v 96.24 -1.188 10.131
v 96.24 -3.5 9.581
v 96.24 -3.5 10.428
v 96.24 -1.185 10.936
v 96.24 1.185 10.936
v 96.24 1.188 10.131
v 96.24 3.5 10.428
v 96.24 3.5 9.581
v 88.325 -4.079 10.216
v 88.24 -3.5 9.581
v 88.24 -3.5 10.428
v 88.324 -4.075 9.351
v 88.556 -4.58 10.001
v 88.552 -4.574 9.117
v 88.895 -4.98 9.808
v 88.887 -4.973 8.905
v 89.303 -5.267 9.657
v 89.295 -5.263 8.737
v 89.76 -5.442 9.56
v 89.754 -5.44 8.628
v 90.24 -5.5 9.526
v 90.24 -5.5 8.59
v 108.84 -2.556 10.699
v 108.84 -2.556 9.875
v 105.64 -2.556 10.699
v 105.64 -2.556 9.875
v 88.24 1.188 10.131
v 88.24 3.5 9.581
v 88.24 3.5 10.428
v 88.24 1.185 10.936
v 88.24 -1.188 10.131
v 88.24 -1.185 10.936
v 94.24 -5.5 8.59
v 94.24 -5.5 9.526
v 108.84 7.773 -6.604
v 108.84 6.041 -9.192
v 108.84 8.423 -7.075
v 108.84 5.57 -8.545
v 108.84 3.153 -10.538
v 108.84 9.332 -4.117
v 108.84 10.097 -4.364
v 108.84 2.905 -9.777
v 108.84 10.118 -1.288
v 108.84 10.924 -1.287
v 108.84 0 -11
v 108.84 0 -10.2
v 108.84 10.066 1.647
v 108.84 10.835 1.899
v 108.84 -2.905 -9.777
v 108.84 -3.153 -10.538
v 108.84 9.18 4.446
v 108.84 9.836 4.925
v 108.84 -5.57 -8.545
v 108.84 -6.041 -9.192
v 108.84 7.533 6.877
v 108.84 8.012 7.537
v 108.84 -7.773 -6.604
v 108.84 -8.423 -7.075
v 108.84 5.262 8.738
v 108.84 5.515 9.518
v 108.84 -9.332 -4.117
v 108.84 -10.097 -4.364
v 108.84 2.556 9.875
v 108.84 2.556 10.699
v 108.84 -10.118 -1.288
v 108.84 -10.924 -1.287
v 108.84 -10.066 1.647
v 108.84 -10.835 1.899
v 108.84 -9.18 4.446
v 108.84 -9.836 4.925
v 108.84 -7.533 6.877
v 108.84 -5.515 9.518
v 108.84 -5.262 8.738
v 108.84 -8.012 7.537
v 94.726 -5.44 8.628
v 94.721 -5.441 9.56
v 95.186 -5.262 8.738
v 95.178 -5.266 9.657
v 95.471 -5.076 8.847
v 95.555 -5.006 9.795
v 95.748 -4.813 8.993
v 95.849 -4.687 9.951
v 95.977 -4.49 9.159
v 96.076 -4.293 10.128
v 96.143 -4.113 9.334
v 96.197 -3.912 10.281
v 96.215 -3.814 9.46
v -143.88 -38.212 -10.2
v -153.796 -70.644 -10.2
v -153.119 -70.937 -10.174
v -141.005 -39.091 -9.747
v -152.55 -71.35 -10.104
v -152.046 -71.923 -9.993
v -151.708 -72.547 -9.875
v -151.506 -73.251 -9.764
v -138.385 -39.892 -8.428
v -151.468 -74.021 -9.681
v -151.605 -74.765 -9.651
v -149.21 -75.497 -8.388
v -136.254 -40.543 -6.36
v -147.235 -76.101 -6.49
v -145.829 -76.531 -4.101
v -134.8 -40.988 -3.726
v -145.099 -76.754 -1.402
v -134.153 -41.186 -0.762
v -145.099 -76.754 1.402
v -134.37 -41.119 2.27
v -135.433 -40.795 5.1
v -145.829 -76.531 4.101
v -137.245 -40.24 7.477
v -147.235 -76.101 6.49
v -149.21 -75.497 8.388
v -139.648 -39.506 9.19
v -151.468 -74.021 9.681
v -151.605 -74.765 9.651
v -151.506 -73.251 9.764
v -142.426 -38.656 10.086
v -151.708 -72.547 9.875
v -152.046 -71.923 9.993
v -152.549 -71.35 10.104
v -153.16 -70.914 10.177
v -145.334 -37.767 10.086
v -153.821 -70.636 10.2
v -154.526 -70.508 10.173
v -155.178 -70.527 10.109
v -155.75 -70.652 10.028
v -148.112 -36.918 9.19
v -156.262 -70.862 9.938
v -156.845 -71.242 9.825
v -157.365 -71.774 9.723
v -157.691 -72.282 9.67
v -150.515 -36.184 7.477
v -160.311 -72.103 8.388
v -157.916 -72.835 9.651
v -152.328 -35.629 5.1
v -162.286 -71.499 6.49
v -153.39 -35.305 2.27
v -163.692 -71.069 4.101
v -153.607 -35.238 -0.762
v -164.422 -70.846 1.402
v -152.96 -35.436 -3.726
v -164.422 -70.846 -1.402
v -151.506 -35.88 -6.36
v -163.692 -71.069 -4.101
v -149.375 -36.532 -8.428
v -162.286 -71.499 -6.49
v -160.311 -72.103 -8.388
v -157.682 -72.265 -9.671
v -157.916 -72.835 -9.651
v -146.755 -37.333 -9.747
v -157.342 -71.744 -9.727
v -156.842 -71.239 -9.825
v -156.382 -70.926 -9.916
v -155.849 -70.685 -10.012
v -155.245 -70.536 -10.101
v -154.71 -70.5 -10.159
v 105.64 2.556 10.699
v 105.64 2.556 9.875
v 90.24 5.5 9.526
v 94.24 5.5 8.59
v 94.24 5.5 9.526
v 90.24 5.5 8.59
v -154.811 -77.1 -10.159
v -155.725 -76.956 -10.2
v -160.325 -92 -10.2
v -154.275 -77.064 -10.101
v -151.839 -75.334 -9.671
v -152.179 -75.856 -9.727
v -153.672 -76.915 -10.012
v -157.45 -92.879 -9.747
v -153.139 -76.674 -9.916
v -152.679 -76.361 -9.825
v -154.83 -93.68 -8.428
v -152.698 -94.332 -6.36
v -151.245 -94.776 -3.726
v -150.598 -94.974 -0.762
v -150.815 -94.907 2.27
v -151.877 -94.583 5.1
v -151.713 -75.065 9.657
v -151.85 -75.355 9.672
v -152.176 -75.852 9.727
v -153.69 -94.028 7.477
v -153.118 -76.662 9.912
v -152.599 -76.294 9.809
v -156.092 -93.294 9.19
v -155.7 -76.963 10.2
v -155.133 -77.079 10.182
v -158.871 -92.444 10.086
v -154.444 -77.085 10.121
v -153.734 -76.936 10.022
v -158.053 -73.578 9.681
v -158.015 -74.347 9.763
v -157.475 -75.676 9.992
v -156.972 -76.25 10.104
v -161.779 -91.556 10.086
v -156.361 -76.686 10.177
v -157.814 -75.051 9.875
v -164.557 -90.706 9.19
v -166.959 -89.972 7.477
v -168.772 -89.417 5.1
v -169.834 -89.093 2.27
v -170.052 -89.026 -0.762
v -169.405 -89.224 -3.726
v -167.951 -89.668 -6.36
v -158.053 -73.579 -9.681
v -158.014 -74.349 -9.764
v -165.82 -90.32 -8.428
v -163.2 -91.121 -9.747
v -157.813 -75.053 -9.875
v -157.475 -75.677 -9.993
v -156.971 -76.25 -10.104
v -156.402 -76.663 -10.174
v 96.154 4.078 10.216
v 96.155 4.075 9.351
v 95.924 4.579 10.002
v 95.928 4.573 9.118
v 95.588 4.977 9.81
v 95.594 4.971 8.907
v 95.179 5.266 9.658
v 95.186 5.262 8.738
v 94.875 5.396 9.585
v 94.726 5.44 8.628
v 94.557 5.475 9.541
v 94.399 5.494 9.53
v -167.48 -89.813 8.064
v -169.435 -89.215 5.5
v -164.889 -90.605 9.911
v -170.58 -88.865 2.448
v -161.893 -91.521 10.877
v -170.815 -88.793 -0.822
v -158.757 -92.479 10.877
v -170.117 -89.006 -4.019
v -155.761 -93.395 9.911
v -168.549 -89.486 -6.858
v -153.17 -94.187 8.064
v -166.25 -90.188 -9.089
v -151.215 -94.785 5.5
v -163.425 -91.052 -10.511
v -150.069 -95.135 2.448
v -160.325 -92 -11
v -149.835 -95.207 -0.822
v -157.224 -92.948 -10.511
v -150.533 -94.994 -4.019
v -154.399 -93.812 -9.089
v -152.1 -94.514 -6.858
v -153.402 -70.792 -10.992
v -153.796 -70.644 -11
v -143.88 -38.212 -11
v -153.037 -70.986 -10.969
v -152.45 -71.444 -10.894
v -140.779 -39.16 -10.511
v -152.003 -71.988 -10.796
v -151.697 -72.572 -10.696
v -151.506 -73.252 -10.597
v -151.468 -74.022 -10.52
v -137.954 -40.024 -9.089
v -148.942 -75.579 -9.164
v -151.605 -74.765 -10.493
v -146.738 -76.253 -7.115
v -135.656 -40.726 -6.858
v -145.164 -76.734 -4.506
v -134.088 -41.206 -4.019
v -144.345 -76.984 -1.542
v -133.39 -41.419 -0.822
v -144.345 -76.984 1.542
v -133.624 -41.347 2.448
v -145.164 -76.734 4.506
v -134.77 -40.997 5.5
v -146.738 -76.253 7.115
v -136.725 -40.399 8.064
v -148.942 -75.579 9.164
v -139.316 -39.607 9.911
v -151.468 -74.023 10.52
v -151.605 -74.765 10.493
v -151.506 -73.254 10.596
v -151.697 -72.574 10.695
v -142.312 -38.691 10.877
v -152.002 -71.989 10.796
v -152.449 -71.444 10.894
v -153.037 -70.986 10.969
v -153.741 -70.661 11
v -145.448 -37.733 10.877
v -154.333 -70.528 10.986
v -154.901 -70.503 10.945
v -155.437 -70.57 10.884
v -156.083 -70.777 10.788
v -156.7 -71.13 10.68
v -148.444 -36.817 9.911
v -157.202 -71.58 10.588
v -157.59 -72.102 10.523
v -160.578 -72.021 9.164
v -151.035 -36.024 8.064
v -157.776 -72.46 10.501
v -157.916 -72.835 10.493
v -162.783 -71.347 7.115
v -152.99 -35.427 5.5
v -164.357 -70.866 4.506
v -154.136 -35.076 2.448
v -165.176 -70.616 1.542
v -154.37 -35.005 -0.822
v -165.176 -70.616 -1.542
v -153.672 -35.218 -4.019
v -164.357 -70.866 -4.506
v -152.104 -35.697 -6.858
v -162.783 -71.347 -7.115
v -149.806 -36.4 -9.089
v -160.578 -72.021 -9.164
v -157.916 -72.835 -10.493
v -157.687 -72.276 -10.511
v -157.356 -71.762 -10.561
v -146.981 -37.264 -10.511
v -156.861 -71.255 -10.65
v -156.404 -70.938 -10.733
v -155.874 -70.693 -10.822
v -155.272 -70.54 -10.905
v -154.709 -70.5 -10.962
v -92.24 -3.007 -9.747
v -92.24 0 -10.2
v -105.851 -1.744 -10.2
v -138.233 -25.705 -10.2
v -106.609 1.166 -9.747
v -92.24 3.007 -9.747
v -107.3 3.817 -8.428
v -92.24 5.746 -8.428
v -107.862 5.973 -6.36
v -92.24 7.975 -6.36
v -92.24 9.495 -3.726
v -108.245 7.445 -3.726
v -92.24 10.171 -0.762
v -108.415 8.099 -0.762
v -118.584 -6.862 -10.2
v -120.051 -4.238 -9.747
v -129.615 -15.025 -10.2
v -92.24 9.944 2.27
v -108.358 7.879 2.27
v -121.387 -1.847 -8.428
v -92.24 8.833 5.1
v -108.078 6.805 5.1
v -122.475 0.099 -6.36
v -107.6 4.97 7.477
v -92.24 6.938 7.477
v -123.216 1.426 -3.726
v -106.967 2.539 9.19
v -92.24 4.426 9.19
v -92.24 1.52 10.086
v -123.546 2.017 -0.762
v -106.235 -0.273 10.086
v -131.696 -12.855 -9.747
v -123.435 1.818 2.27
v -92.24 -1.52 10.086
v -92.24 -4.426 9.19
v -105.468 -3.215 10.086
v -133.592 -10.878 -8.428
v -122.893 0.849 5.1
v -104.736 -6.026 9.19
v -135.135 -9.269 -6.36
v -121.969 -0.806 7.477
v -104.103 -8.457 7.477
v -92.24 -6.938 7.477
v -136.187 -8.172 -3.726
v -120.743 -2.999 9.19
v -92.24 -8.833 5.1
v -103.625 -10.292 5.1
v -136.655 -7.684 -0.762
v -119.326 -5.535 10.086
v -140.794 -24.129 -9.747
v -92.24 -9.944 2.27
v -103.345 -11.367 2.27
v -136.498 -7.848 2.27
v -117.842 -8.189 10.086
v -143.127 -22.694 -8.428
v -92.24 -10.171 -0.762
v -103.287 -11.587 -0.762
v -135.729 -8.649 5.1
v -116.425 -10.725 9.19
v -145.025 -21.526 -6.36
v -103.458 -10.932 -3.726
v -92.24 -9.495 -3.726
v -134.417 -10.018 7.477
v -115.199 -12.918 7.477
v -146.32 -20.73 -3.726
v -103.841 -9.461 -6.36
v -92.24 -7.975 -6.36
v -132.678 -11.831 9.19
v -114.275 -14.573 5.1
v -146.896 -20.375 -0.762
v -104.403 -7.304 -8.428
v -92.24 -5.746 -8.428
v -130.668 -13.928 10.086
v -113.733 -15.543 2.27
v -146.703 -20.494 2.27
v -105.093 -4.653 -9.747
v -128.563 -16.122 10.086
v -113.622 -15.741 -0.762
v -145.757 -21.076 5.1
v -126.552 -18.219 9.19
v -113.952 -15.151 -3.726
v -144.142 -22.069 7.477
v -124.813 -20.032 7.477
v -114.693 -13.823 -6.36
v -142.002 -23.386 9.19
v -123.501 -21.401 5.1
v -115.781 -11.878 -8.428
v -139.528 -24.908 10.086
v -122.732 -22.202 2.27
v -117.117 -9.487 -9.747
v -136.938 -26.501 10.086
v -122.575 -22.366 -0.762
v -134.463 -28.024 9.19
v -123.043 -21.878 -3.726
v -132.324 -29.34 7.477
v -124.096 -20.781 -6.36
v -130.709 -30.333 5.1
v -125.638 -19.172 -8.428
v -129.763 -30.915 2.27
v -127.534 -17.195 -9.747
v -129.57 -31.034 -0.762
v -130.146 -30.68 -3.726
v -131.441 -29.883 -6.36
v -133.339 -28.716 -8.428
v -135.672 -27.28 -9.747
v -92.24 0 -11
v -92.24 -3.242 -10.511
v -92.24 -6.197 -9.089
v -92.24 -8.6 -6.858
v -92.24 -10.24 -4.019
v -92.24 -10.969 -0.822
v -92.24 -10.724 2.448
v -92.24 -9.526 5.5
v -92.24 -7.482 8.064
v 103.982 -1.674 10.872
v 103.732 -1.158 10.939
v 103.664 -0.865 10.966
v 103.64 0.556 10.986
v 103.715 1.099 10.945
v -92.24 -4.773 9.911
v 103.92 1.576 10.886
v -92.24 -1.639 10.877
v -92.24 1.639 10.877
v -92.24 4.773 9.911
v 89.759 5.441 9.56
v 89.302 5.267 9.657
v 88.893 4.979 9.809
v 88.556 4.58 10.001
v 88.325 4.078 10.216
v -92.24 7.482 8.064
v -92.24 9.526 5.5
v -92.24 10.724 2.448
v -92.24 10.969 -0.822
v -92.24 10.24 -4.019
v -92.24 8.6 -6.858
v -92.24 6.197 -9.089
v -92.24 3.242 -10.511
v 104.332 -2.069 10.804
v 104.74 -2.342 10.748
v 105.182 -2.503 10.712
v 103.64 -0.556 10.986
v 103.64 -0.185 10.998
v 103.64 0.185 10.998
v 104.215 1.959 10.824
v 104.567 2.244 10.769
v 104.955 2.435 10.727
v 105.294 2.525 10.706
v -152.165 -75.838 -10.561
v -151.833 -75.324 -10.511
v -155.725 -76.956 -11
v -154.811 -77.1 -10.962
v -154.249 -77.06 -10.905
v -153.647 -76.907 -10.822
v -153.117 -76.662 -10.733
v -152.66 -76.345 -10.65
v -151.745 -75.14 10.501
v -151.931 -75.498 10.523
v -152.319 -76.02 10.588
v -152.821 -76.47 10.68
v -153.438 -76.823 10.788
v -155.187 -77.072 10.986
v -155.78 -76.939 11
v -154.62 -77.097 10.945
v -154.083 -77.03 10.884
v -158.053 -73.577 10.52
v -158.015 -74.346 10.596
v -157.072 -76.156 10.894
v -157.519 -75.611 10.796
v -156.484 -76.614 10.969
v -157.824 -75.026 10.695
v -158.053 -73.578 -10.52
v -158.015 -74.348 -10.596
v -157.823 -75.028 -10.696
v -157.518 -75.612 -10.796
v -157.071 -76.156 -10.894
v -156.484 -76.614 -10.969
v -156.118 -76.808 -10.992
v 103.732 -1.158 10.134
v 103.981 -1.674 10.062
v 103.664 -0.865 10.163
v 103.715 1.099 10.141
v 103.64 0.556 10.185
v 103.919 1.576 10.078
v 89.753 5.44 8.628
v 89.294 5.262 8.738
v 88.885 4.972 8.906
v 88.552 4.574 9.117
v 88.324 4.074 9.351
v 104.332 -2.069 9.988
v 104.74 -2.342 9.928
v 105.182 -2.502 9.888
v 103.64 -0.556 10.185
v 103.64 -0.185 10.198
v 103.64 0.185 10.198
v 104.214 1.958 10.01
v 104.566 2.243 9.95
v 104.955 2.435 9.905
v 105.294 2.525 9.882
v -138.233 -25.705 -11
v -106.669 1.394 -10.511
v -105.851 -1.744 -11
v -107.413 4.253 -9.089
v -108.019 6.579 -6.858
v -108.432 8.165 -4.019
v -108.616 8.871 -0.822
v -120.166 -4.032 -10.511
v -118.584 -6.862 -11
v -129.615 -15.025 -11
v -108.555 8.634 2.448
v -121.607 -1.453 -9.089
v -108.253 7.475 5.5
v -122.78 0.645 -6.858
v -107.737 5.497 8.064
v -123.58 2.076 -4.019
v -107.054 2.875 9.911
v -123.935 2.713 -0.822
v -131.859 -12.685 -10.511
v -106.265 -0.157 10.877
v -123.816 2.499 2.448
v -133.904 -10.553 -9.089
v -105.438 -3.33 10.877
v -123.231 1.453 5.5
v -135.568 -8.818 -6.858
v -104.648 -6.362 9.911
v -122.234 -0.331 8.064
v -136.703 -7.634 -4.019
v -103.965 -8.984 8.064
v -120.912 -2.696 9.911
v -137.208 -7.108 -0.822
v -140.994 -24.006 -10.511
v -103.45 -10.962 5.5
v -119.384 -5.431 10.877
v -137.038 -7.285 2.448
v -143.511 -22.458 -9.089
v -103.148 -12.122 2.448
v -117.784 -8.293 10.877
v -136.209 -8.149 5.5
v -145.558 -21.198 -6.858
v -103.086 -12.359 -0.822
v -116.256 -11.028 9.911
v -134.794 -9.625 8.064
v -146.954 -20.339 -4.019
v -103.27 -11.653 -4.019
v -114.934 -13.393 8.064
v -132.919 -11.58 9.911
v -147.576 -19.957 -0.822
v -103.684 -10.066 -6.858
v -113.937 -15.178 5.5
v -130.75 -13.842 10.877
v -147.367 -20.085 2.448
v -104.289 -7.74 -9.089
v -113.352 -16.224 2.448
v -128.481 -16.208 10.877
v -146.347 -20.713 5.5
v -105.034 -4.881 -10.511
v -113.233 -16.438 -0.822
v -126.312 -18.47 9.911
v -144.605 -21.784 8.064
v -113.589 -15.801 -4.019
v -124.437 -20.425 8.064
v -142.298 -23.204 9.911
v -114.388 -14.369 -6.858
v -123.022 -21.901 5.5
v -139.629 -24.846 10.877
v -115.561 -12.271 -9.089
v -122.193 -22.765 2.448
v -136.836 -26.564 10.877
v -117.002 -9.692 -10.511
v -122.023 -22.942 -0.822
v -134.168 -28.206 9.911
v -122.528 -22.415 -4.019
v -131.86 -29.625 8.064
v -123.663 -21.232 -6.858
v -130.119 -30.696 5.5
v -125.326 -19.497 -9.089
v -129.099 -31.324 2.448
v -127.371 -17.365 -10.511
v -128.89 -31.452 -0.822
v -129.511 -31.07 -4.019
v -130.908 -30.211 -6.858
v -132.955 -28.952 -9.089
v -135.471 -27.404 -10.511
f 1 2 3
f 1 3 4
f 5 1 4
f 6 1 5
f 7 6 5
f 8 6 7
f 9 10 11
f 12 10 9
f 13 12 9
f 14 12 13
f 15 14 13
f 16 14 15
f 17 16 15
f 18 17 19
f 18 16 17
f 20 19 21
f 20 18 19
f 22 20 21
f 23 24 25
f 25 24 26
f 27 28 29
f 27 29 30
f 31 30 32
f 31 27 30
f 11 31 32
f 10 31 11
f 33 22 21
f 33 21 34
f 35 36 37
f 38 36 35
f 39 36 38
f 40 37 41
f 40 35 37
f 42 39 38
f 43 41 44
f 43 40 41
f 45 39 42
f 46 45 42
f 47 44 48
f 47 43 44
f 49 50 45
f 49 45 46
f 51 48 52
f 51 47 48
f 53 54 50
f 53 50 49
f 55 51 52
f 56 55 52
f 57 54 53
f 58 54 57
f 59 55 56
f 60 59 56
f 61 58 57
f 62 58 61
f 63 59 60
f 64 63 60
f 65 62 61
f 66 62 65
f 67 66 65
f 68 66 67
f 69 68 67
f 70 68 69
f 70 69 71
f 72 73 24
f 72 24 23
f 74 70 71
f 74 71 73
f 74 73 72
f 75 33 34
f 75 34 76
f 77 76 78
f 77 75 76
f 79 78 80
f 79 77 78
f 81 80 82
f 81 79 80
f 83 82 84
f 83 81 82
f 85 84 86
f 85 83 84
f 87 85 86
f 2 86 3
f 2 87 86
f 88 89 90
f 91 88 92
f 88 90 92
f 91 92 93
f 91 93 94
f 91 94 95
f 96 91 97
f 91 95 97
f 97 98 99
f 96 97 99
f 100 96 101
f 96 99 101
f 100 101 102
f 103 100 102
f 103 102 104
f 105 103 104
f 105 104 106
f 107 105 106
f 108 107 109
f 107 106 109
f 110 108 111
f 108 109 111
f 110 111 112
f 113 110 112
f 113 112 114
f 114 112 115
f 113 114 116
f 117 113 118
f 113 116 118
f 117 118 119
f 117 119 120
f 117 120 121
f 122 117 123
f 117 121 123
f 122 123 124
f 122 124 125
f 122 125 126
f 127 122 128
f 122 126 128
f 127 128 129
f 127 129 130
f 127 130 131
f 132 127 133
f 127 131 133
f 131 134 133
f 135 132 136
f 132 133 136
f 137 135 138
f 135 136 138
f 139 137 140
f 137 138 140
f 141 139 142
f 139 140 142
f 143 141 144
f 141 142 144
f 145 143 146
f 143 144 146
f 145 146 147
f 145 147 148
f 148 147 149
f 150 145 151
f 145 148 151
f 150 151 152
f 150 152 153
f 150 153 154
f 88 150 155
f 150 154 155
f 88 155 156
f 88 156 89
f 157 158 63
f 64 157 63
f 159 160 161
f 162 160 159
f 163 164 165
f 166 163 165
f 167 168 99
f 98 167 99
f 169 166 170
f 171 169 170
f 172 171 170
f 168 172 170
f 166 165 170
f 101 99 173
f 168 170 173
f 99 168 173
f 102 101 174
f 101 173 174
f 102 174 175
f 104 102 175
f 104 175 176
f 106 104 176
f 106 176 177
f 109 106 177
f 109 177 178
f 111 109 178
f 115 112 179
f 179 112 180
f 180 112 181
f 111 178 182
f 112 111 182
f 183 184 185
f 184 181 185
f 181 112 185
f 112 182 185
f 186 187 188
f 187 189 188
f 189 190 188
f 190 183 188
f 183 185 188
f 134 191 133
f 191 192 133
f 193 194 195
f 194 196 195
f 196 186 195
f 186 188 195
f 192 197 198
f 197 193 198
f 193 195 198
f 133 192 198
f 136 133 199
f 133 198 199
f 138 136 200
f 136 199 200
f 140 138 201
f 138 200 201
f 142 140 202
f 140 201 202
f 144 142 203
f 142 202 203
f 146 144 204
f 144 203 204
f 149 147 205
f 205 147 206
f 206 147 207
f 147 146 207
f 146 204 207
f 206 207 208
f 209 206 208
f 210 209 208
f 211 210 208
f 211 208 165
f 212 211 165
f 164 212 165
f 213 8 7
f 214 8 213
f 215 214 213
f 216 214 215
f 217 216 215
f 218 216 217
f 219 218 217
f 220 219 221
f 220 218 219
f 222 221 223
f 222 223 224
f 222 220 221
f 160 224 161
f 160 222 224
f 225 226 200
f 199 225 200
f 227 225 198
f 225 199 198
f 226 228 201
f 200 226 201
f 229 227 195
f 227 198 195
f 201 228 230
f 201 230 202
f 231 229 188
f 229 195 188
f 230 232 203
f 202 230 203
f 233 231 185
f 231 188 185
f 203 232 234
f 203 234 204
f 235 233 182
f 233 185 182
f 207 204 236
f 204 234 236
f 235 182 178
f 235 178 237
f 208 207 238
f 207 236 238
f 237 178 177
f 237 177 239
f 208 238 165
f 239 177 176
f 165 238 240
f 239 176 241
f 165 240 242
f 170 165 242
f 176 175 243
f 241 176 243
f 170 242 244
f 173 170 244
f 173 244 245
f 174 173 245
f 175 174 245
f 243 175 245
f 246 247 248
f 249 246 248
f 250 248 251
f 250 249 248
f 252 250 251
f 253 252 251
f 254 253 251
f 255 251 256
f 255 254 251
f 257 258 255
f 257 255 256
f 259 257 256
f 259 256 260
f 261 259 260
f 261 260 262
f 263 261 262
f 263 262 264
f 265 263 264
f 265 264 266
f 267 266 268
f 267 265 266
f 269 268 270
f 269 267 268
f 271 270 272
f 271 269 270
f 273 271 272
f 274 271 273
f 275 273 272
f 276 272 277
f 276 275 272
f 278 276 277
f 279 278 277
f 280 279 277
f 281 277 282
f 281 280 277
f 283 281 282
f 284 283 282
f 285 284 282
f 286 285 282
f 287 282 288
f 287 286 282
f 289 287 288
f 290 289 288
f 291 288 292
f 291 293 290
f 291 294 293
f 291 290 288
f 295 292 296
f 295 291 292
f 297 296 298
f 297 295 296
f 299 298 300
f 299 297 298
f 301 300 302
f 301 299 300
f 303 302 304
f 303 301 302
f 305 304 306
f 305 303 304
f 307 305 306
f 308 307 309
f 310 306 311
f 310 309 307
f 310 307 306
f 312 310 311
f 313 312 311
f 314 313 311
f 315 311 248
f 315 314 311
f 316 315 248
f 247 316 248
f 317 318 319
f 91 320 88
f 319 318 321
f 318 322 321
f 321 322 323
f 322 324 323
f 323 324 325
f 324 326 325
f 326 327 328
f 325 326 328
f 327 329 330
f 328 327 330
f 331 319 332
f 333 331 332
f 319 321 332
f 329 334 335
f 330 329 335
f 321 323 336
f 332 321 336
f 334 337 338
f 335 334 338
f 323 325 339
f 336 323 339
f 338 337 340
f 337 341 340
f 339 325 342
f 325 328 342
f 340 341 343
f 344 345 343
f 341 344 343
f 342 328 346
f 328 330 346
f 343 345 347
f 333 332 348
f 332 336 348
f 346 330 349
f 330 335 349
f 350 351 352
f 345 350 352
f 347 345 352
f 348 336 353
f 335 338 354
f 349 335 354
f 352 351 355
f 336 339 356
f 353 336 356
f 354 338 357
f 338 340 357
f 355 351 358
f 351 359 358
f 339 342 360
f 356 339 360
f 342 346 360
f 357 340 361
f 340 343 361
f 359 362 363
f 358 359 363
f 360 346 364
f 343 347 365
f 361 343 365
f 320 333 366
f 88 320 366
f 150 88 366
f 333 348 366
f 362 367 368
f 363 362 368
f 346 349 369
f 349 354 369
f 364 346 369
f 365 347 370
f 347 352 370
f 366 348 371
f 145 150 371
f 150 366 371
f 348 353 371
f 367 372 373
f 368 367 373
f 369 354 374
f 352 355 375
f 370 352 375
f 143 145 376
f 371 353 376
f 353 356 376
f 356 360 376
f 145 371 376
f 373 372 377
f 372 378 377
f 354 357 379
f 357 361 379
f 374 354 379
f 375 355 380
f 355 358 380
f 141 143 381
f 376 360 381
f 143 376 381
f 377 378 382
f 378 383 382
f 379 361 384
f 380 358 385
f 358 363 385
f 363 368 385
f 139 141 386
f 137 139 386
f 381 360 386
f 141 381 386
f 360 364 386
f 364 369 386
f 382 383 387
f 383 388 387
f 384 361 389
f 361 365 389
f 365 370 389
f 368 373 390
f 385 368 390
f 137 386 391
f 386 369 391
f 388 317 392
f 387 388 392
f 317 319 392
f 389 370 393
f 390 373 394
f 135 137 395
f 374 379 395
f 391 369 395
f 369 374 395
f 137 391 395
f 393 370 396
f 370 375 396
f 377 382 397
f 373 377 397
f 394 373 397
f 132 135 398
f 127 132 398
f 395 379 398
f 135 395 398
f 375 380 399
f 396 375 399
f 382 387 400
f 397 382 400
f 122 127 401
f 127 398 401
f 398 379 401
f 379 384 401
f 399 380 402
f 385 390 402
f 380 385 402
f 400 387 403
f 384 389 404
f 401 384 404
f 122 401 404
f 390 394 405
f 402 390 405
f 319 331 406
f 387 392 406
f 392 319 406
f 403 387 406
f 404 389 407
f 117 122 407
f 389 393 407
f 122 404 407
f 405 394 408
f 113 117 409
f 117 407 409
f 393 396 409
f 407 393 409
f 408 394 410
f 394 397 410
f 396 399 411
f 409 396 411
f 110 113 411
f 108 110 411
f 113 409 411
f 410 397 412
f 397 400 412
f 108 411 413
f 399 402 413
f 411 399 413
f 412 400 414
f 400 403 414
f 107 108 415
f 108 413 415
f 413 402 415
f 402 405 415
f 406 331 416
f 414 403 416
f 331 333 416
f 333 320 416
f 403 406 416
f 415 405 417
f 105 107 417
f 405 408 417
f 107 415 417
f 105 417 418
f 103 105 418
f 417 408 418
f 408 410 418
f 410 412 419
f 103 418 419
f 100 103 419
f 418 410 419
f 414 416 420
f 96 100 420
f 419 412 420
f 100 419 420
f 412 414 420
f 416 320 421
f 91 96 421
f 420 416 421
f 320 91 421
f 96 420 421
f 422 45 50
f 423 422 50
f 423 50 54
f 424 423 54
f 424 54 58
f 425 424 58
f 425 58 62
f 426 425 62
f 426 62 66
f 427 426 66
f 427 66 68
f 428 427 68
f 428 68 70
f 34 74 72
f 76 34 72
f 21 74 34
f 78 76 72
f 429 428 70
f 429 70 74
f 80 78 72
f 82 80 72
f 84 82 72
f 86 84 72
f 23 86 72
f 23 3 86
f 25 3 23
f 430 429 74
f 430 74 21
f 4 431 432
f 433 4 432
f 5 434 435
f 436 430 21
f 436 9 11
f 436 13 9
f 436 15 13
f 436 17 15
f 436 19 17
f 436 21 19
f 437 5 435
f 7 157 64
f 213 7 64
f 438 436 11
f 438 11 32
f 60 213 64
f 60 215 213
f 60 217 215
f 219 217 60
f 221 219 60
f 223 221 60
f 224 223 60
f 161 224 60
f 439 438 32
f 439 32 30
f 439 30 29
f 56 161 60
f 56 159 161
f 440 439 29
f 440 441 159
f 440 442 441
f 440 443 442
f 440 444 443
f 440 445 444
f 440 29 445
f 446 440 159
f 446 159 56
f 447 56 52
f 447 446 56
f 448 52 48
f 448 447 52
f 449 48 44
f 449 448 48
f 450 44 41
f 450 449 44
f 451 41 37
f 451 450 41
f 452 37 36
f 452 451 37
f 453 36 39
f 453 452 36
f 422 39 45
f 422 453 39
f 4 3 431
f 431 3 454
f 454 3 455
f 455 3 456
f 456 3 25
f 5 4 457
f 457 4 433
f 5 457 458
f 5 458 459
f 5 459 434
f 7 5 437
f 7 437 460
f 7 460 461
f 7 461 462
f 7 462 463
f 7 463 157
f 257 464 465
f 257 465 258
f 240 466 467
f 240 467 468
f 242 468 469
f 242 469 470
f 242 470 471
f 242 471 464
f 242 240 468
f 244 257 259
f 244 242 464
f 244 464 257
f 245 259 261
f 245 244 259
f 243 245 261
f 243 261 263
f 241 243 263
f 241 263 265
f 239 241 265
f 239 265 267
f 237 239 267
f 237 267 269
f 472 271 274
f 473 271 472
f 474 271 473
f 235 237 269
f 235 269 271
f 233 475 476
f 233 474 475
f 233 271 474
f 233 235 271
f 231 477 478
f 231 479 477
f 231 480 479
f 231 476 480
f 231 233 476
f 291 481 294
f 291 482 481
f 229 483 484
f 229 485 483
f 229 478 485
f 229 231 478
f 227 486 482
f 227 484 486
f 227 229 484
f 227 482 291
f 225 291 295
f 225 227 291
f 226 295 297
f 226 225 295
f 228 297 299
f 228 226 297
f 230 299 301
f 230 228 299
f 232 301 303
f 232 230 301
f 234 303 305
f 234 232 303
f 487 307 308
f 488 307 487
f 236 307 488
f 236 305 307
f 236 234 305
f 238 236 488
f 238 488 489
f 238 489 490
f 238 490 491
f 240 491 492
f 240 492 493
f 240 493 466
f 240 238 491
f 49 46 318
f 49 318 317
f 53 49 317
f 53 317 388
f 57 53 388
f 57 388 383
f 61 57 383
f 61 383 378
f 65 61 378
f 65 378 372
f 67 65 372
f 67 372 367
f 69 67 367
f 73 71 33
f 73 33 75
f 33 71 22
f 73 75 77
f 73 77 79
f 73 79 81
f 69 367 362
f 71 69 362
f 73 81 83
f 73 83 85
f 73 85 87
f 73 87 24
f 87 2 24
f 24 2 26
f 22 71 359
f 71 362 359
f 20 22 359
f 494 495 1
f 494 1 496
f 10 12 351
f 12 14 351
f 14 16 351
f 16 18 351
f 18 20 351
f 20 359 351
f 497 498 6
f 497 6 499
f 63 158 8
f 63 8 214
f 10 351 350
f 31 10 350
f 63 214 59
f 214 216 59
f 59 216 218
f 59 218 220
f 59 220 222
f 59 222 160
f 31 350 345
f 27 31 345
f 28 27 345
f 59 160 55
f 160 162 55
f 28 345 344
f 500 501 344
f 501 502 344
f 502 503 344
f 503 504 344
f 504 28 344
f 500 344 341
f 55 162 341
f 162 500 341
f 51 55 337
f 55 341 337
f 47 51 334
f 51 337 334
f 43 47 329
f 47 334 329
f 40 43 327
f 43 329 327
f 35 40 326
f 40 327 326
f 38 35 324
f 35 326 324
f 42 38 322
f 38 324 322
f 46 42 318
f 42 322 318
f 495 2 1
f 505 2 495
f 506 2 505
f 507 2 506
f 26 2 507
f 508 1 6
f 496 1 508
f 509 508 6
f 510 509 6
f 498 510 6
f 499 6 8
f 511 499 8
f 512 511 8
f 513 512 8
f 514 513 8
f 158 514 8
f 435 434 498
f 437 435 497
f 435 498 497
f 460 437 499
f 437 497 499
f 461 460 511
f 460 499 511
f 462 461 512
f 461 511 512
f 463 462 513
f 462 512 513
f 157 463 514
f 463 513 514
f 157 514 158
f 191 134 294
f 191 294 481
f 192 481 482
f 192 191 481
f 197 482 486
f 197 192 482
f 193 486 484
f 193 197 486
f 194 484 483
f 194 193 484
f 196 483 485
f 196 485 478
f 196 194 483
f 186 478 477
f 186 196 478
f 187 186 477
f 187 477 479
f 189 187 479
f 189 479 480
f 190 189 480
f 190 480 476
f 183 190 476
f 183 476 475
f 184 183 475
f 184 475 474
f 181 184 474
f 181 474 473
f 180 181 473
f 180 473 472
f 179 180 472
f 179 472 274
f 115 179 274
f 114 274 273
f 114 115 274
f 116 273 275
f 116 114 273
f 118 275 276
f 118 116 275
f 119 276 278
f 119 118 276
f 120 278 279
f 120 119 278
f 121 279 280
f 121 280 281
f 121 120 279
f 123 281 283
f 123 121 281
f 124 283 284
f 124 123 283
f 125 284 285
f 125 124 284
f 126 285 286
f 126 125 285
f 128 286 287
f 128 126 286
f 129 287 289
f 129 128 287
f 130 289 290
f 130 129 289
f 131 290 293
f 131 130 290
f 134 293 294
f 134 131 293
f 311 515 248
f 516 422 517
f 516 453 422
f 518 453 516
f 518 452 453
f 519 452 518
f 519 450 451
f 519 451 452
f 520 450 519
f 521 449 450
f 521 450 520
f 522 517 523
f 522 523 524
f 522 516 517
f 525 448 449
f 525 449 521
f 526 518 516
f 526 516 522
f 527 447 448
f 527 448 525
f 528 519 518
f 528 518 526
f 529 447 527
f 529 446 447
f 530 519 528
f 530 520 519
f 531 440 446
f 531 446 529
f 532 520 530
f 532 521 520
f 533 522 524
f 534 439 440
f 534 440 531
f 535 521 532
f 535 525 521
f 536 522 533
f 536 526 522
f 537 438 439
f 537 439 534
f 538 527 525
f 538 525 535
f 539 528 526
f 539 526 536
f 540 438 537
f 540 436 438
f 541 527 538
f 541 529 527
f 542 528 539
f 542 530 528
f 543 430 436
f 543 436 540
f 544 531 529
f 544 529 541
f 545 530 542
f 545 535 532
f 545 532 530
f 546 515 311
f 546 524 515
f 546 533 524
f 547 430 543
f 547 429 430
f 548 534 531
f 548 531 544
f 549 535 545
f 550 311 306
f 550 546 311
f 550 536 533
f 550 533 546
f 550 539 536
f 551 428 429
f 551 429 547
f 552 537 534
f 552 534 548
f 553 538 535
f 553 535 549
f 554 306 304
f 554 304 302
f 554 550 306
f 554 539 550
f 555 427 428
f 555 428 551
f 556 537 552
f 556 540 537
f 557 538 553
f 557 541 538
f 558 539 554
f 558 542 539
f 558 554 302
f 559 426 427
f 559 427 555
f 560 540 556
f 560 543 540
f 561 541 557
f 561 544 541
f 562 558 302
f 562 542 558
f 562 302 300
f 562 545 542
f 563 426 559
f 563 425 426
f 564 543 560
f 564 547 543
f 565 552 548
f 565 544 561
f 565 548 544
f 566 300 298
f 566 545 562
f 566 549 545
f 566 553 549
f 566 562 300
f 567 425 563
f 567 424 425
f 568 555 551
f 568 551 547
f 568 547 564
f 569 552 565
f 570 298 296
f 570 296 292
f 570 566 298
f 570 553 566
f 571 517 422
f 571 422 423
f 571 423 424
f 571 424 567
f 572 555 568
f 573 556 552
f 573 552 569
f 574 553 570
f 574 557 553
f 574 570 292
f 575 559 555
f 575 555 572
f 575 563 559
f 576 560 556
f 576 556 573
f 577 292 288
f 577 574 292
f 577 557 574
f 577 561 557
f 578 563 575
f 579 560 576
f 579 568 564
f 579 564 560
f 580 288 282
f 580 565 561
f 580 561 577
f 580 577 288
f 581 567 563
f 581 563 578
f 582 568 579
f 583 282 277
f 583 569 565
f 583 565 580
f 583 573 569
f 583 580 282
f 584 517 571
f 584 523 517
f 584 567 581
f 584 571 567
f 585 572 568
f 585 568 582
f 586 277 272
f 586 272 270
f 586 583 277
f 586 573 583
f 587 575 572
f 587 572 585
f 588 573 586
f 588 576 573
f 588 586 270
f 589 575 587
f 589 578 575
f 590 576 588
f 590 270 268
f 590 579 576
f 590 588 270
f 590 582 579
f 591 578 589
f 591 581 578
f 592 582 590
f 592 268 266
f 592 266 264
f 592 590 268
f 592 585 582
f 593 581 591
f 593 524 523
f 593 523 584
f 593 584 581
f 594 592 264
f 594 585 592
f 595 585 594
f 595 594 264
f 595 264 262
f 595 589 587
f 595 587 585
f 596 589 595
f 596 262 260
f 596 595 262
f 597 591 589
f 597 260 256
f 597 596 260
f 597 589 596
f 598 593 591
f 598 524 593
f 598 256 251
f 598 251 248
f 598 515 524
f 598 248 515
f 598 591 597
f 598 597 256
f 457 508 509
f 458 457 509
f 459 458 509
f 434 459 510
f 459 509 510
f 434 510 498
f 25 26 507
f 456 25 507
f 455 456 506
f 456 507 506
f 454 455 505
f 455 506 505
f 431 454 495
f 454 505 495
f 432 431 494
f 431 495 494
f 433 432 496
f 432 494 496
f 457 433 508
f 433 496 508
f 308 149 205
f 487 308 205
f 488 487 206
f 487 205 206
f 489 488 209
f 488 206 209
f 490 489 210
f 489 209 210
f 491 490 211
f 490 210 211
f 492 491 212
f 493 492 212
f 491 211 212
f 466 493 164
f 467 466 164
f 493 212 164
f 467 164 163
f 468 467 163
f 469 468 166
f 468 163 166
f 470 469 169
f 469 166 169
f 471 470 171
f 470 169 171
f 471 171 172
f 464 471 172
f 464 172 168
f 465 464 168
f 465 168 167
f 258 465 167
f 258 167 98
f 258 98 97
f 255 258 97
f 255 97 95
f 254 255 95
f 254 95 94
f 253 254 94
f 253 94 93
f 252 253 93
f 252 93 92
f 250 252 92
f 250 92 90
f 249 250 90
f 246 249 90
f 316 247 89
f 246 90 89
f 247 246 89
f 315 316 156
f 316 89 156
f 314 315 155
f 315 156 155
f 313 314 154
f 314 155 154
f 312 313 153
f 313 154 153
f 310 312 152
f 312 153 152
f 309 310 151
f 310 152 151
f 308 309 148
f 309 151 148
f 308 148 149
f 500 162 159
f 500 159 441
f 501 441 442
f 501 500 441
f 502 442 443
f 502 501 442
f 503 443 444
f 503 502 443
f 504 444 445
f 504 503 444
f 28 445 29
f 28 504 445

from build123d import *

# Parameters (mm, degrees)
SKETCH3_R          = 11
SKETCH3_R_2        = 10.2
CUT_EXTRUDE1_REACH = 197.895
SKETCH4_R          = 3.3
SKETCH5_R          = 3.3
CUT_EXTRUDE2_DEPTH = 196.894862351


with BuildPart() as part:
    # Sweep2: sweep along a path in Sketch1
    with BuildLine(Plane.XY) as sweep2_path:
        Line((108.839588828, 0), (92.239588828, 0))
        Line((92.239588828, 0), (-92.239588828, 0))
        ThreePointArc((-92.239588828, 0), (-124.360019313, -10.591729527), (-143.88004565, -38.211927945))
        Line((-143.88004565, -38.211927945), (-154.760411172, -73.8))
        Line((-154.760411172, -73.8), (-160.324709574, -92))
    # Sketch3 → Sweep2 (sweep)
    with BuildSketch(Plane(origin=(92.239588828, 0, 0), x_dir=(0, 0, -1), z_dir=(1, 0, 0))):
        Circle(SKETCH3_R)
        Circle(SKETCH3_R_2, mode=Mode.SUBTRACT)
    sweep(path=sweep2_path.line)

    # Sketch4 → Cut-Extrude1 (cut, up to next)
    with BuildSketch(Plane.XY, mode=Mode.PRIVATE) as cut_extrude1_sk1:
        with Locations((-154.760411172, -73.8)):
            Circle(SKETCH4_R)
    cut_extrude1_tool1 = extrude(cut_extrude1_sk1.sketch, amount=CUT_EXTRUDE1_REACH, mode=Mode.PRIVATE) & part.part
    # Sketch4 → Cut-Extrude1 (cut, up to next)
    with BuildSketch(Plane.XY, mode=Mode.PRIVATE) as cut_extrude1_sk2:
        with BuildLine():
            Line((108.839588828, 2.555545653), (108.839588828, -2.555545653))
            Line((108.839588828, -2.555545653), (105.639588828, -2.555545653))
            ThreePointArc((105.639588828, -2.555545653), (104.225375266, -1.969759216), (103.639588828, -0.555545653))
            Line((103.639588828, -0.555545653), (103.639588828, 0.555545653))
            ThreePointArc((103.639588828, 0.555545653), (104.225375266, 1.969759216), (105.639588828, 2.555545653))
            Line((105.639588828, 2.555545653), (108.839588828, 2.555545653))
        make_face()
    cut_extrude1_tool2 = extrude(cut_extrude1_sk2.sketch, amount=CUT_EXTRUDE1_REACH, mode=Mode.PRIVATE) & part.part
    # Sketch4 → Cut-Extrude1 (cut, up to next)
    with BuildSketch(Plane.XY, mode=Mode.PRIVATE) as cut_extrude1_sk3:
        with BuildLine():
            Line((90.239588828, -5.5), (94.239588828, -5.5))
            ThreePointArc((94.239588828, -5.5), (95.653802391, -4.914213562), (96.239588828, -3.5))
            Line((96.239588828, -3.5), (96.239588828, 3.5))
            ThreePointArc((96.239588828, 3.5), (95.653802391, 4.914213562), (94.239588828, 5.5))
            Line((94.239588828, 5.5), (90.239588828, 5.5))
            ThreePointArc((90.239588828, 5.5), (88.825375266, 4.914213562), (88.239588828, 3.5))
            Line((88.239588828, 3.5), (88.239588828, -3.5))
            ThreePointArc((88.239588828, -3.5), (88.825375266, -4.914213562), (90.239588828, -5.5))
        make_face()
    cut_extrude1_tool3 = extrude(cut_extrude1_sk3.sketch, amount=CUT_EXTRUDE1_REACH, mode=Mode.PRIVATE) & part.part
    add(cut_extrude1_tool1.solids().sort_by_distance((-154.760411, -73.8, 0))[0], mode=Mode.SUBTRACT)
    add(cut_extrude1_tool2.solids().sort_by_distance((106.388287, 0, 0))[0], mode=Mode.SUBTRACT)
    add(cut_extrude1_tool3.solids().sort_by_distance((92.239589, 0, 0))[0], mode=Mode.SUBTRACT)

    # Sketch5 → Cut-Extrude2 (cut, through all)
    with BuildSketch(Plane.XY):
        with Locations((-154.760411172, -73.8)):
            Circle(SKETCH5_R)
    extrude(amount=-CUT_EXTRUDE2_DEPTH, mode=Mode.SUBTRACT)


solid = part.part
